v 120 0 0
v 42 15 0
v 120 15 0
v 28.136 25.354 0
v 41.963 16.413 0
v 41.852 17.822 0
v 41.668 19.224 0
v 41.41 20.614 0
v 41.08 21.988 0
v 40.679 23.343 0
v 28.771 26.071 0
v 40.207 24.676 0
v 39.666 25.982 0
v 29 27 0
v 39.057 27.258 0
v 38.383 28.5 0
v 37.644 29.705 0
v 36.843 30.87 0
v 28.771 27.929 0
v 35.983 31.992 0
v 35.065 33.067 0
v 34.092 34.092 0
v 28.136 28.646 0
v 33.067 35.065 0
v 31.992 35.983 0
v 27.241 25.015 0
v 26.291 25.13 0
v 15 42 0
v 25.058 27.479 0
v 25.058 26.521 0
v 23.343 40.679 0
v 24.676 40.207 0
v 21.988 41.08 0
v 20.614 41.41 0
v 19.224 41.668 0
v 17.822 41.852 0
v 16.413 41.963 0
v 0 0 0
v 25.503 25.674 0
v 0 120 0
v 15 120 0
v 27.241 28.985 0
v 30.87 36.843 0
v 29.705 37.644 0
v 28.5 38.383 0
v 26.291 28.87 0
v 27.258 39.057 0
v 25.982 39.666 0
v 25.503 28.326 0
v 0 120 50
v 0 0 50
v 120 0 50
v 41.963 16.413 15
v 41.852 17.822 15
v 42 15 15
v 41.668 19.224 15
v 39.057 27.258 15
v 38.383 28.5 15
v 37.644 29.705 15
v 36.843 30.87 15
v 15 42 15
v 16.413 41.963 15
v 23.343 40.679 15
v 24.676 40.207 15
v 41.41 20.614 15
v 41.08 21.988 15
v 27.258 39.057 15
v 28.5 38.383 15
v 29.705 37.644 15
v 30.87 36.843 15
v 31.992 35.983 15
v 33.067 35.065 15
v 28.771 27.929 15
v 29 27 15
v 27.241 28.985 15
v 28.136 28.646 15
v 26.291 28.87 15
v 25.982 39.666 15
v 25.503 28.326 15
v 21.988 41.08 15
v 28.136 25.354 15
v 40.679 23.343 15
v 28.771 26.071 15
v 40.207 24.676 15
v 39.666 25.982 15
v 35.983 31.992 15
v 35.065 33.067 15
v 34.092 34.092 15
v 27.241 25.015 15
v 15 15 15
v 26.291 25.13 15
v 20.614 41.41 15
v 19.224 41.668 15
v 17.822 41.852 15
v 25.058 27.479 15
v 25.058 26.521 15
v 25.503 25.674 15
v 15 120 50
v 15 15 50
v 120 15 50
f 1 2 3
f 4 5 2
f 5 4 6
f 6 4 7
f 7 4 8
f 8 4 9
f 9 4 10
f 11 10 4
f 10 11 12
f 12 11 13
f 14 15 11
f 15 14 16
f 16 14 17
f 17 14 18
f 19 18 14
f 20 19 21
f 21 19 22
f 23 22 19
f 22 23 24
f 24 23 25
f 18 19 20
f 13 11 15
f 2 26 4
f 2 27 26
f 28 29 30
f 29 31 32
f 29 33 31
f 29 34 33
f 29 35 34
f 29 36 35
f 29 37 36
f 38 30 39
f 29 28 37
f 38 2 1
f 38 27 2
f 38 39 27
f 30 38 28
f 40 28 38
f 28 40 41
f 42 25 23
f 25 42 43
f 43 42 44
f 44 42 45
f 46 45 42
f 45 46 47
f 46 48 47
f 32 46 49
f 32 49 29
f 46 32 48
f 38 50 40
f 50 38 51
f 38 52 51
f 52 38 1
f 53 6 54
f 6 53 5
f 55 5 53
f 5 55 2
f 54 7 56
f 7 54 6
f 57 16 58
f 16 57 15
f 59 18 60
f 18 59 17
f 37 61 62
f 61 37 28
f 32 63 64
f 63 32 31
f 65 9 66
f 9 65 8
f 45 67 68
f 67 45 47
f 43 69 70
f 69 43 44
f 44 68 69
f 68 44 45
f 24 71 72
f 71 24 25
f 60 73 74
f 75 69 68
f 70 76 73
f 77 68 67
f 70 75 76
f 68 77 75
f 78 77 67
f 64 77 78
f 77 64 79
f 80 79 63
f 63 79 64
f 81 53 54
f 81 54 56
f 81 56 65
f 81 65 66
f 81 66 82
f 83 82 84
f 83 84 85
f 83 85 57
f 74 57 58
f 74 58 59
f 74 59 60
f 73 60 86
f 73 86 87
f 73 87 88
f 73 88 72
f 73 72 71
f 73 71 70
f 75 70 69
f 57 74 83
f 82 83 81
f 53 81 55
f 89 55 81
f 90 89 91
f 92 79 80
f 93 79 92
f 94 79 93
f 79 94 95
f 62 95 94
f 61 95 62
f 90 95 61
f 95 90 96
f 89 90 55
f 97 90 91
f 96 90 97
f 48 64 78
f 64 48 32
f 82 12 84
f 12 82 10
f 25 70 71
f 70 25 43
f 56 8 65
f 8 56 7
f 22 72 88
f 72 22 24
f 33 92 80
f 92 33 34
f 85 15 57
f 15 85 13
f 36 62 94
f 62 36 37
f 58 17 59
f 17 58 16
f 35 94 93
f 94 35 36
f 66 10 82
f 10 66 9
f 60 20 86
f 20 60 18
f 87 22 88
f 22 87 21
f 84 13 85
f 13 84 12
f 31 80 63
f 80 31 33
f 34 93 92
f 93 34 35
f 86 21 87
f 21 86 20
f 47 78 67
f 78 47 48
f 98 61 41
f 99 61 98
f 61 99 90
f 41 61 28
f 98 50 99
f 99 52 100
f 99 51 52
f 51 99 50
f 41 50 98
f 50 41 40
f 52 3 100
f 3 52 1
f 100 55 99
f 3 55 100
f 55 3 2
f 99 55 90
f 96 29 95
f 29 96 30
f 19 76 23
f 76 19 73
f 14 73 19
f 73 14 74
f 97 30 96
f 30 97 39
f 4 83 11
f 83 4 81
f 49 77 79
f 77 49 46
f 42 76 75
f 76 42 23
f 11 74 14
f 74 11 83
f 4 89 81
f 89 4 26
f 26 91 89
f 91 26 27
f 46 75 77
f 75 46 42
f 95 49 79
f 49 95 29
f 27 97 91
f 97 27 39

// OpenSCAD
// Temporary support stand-offs for the front panel
// until we have a case built.

// dimensions in millimetres.
wall = 15;
height = 50;
length = 120;
stud_surround = 24;

// Set arc smoothness limits for a better finish.
$fa = 3;
$fs = 1;

difference() {
  union() {
    cube([wall, length, height]);
    cube([length, wall, height]);
    intersection() {
      cube([length, length, height]);
      translate([wall, wall, 0]) {
        cylinder(r=wall + stud_surround/2, h=15);
      }
    }
  }
  translate([wall + stud_surround/2, wall + stud_surround/2, 0]) {
    cylinder(d=4, h = 32, center=true);
  }
}
